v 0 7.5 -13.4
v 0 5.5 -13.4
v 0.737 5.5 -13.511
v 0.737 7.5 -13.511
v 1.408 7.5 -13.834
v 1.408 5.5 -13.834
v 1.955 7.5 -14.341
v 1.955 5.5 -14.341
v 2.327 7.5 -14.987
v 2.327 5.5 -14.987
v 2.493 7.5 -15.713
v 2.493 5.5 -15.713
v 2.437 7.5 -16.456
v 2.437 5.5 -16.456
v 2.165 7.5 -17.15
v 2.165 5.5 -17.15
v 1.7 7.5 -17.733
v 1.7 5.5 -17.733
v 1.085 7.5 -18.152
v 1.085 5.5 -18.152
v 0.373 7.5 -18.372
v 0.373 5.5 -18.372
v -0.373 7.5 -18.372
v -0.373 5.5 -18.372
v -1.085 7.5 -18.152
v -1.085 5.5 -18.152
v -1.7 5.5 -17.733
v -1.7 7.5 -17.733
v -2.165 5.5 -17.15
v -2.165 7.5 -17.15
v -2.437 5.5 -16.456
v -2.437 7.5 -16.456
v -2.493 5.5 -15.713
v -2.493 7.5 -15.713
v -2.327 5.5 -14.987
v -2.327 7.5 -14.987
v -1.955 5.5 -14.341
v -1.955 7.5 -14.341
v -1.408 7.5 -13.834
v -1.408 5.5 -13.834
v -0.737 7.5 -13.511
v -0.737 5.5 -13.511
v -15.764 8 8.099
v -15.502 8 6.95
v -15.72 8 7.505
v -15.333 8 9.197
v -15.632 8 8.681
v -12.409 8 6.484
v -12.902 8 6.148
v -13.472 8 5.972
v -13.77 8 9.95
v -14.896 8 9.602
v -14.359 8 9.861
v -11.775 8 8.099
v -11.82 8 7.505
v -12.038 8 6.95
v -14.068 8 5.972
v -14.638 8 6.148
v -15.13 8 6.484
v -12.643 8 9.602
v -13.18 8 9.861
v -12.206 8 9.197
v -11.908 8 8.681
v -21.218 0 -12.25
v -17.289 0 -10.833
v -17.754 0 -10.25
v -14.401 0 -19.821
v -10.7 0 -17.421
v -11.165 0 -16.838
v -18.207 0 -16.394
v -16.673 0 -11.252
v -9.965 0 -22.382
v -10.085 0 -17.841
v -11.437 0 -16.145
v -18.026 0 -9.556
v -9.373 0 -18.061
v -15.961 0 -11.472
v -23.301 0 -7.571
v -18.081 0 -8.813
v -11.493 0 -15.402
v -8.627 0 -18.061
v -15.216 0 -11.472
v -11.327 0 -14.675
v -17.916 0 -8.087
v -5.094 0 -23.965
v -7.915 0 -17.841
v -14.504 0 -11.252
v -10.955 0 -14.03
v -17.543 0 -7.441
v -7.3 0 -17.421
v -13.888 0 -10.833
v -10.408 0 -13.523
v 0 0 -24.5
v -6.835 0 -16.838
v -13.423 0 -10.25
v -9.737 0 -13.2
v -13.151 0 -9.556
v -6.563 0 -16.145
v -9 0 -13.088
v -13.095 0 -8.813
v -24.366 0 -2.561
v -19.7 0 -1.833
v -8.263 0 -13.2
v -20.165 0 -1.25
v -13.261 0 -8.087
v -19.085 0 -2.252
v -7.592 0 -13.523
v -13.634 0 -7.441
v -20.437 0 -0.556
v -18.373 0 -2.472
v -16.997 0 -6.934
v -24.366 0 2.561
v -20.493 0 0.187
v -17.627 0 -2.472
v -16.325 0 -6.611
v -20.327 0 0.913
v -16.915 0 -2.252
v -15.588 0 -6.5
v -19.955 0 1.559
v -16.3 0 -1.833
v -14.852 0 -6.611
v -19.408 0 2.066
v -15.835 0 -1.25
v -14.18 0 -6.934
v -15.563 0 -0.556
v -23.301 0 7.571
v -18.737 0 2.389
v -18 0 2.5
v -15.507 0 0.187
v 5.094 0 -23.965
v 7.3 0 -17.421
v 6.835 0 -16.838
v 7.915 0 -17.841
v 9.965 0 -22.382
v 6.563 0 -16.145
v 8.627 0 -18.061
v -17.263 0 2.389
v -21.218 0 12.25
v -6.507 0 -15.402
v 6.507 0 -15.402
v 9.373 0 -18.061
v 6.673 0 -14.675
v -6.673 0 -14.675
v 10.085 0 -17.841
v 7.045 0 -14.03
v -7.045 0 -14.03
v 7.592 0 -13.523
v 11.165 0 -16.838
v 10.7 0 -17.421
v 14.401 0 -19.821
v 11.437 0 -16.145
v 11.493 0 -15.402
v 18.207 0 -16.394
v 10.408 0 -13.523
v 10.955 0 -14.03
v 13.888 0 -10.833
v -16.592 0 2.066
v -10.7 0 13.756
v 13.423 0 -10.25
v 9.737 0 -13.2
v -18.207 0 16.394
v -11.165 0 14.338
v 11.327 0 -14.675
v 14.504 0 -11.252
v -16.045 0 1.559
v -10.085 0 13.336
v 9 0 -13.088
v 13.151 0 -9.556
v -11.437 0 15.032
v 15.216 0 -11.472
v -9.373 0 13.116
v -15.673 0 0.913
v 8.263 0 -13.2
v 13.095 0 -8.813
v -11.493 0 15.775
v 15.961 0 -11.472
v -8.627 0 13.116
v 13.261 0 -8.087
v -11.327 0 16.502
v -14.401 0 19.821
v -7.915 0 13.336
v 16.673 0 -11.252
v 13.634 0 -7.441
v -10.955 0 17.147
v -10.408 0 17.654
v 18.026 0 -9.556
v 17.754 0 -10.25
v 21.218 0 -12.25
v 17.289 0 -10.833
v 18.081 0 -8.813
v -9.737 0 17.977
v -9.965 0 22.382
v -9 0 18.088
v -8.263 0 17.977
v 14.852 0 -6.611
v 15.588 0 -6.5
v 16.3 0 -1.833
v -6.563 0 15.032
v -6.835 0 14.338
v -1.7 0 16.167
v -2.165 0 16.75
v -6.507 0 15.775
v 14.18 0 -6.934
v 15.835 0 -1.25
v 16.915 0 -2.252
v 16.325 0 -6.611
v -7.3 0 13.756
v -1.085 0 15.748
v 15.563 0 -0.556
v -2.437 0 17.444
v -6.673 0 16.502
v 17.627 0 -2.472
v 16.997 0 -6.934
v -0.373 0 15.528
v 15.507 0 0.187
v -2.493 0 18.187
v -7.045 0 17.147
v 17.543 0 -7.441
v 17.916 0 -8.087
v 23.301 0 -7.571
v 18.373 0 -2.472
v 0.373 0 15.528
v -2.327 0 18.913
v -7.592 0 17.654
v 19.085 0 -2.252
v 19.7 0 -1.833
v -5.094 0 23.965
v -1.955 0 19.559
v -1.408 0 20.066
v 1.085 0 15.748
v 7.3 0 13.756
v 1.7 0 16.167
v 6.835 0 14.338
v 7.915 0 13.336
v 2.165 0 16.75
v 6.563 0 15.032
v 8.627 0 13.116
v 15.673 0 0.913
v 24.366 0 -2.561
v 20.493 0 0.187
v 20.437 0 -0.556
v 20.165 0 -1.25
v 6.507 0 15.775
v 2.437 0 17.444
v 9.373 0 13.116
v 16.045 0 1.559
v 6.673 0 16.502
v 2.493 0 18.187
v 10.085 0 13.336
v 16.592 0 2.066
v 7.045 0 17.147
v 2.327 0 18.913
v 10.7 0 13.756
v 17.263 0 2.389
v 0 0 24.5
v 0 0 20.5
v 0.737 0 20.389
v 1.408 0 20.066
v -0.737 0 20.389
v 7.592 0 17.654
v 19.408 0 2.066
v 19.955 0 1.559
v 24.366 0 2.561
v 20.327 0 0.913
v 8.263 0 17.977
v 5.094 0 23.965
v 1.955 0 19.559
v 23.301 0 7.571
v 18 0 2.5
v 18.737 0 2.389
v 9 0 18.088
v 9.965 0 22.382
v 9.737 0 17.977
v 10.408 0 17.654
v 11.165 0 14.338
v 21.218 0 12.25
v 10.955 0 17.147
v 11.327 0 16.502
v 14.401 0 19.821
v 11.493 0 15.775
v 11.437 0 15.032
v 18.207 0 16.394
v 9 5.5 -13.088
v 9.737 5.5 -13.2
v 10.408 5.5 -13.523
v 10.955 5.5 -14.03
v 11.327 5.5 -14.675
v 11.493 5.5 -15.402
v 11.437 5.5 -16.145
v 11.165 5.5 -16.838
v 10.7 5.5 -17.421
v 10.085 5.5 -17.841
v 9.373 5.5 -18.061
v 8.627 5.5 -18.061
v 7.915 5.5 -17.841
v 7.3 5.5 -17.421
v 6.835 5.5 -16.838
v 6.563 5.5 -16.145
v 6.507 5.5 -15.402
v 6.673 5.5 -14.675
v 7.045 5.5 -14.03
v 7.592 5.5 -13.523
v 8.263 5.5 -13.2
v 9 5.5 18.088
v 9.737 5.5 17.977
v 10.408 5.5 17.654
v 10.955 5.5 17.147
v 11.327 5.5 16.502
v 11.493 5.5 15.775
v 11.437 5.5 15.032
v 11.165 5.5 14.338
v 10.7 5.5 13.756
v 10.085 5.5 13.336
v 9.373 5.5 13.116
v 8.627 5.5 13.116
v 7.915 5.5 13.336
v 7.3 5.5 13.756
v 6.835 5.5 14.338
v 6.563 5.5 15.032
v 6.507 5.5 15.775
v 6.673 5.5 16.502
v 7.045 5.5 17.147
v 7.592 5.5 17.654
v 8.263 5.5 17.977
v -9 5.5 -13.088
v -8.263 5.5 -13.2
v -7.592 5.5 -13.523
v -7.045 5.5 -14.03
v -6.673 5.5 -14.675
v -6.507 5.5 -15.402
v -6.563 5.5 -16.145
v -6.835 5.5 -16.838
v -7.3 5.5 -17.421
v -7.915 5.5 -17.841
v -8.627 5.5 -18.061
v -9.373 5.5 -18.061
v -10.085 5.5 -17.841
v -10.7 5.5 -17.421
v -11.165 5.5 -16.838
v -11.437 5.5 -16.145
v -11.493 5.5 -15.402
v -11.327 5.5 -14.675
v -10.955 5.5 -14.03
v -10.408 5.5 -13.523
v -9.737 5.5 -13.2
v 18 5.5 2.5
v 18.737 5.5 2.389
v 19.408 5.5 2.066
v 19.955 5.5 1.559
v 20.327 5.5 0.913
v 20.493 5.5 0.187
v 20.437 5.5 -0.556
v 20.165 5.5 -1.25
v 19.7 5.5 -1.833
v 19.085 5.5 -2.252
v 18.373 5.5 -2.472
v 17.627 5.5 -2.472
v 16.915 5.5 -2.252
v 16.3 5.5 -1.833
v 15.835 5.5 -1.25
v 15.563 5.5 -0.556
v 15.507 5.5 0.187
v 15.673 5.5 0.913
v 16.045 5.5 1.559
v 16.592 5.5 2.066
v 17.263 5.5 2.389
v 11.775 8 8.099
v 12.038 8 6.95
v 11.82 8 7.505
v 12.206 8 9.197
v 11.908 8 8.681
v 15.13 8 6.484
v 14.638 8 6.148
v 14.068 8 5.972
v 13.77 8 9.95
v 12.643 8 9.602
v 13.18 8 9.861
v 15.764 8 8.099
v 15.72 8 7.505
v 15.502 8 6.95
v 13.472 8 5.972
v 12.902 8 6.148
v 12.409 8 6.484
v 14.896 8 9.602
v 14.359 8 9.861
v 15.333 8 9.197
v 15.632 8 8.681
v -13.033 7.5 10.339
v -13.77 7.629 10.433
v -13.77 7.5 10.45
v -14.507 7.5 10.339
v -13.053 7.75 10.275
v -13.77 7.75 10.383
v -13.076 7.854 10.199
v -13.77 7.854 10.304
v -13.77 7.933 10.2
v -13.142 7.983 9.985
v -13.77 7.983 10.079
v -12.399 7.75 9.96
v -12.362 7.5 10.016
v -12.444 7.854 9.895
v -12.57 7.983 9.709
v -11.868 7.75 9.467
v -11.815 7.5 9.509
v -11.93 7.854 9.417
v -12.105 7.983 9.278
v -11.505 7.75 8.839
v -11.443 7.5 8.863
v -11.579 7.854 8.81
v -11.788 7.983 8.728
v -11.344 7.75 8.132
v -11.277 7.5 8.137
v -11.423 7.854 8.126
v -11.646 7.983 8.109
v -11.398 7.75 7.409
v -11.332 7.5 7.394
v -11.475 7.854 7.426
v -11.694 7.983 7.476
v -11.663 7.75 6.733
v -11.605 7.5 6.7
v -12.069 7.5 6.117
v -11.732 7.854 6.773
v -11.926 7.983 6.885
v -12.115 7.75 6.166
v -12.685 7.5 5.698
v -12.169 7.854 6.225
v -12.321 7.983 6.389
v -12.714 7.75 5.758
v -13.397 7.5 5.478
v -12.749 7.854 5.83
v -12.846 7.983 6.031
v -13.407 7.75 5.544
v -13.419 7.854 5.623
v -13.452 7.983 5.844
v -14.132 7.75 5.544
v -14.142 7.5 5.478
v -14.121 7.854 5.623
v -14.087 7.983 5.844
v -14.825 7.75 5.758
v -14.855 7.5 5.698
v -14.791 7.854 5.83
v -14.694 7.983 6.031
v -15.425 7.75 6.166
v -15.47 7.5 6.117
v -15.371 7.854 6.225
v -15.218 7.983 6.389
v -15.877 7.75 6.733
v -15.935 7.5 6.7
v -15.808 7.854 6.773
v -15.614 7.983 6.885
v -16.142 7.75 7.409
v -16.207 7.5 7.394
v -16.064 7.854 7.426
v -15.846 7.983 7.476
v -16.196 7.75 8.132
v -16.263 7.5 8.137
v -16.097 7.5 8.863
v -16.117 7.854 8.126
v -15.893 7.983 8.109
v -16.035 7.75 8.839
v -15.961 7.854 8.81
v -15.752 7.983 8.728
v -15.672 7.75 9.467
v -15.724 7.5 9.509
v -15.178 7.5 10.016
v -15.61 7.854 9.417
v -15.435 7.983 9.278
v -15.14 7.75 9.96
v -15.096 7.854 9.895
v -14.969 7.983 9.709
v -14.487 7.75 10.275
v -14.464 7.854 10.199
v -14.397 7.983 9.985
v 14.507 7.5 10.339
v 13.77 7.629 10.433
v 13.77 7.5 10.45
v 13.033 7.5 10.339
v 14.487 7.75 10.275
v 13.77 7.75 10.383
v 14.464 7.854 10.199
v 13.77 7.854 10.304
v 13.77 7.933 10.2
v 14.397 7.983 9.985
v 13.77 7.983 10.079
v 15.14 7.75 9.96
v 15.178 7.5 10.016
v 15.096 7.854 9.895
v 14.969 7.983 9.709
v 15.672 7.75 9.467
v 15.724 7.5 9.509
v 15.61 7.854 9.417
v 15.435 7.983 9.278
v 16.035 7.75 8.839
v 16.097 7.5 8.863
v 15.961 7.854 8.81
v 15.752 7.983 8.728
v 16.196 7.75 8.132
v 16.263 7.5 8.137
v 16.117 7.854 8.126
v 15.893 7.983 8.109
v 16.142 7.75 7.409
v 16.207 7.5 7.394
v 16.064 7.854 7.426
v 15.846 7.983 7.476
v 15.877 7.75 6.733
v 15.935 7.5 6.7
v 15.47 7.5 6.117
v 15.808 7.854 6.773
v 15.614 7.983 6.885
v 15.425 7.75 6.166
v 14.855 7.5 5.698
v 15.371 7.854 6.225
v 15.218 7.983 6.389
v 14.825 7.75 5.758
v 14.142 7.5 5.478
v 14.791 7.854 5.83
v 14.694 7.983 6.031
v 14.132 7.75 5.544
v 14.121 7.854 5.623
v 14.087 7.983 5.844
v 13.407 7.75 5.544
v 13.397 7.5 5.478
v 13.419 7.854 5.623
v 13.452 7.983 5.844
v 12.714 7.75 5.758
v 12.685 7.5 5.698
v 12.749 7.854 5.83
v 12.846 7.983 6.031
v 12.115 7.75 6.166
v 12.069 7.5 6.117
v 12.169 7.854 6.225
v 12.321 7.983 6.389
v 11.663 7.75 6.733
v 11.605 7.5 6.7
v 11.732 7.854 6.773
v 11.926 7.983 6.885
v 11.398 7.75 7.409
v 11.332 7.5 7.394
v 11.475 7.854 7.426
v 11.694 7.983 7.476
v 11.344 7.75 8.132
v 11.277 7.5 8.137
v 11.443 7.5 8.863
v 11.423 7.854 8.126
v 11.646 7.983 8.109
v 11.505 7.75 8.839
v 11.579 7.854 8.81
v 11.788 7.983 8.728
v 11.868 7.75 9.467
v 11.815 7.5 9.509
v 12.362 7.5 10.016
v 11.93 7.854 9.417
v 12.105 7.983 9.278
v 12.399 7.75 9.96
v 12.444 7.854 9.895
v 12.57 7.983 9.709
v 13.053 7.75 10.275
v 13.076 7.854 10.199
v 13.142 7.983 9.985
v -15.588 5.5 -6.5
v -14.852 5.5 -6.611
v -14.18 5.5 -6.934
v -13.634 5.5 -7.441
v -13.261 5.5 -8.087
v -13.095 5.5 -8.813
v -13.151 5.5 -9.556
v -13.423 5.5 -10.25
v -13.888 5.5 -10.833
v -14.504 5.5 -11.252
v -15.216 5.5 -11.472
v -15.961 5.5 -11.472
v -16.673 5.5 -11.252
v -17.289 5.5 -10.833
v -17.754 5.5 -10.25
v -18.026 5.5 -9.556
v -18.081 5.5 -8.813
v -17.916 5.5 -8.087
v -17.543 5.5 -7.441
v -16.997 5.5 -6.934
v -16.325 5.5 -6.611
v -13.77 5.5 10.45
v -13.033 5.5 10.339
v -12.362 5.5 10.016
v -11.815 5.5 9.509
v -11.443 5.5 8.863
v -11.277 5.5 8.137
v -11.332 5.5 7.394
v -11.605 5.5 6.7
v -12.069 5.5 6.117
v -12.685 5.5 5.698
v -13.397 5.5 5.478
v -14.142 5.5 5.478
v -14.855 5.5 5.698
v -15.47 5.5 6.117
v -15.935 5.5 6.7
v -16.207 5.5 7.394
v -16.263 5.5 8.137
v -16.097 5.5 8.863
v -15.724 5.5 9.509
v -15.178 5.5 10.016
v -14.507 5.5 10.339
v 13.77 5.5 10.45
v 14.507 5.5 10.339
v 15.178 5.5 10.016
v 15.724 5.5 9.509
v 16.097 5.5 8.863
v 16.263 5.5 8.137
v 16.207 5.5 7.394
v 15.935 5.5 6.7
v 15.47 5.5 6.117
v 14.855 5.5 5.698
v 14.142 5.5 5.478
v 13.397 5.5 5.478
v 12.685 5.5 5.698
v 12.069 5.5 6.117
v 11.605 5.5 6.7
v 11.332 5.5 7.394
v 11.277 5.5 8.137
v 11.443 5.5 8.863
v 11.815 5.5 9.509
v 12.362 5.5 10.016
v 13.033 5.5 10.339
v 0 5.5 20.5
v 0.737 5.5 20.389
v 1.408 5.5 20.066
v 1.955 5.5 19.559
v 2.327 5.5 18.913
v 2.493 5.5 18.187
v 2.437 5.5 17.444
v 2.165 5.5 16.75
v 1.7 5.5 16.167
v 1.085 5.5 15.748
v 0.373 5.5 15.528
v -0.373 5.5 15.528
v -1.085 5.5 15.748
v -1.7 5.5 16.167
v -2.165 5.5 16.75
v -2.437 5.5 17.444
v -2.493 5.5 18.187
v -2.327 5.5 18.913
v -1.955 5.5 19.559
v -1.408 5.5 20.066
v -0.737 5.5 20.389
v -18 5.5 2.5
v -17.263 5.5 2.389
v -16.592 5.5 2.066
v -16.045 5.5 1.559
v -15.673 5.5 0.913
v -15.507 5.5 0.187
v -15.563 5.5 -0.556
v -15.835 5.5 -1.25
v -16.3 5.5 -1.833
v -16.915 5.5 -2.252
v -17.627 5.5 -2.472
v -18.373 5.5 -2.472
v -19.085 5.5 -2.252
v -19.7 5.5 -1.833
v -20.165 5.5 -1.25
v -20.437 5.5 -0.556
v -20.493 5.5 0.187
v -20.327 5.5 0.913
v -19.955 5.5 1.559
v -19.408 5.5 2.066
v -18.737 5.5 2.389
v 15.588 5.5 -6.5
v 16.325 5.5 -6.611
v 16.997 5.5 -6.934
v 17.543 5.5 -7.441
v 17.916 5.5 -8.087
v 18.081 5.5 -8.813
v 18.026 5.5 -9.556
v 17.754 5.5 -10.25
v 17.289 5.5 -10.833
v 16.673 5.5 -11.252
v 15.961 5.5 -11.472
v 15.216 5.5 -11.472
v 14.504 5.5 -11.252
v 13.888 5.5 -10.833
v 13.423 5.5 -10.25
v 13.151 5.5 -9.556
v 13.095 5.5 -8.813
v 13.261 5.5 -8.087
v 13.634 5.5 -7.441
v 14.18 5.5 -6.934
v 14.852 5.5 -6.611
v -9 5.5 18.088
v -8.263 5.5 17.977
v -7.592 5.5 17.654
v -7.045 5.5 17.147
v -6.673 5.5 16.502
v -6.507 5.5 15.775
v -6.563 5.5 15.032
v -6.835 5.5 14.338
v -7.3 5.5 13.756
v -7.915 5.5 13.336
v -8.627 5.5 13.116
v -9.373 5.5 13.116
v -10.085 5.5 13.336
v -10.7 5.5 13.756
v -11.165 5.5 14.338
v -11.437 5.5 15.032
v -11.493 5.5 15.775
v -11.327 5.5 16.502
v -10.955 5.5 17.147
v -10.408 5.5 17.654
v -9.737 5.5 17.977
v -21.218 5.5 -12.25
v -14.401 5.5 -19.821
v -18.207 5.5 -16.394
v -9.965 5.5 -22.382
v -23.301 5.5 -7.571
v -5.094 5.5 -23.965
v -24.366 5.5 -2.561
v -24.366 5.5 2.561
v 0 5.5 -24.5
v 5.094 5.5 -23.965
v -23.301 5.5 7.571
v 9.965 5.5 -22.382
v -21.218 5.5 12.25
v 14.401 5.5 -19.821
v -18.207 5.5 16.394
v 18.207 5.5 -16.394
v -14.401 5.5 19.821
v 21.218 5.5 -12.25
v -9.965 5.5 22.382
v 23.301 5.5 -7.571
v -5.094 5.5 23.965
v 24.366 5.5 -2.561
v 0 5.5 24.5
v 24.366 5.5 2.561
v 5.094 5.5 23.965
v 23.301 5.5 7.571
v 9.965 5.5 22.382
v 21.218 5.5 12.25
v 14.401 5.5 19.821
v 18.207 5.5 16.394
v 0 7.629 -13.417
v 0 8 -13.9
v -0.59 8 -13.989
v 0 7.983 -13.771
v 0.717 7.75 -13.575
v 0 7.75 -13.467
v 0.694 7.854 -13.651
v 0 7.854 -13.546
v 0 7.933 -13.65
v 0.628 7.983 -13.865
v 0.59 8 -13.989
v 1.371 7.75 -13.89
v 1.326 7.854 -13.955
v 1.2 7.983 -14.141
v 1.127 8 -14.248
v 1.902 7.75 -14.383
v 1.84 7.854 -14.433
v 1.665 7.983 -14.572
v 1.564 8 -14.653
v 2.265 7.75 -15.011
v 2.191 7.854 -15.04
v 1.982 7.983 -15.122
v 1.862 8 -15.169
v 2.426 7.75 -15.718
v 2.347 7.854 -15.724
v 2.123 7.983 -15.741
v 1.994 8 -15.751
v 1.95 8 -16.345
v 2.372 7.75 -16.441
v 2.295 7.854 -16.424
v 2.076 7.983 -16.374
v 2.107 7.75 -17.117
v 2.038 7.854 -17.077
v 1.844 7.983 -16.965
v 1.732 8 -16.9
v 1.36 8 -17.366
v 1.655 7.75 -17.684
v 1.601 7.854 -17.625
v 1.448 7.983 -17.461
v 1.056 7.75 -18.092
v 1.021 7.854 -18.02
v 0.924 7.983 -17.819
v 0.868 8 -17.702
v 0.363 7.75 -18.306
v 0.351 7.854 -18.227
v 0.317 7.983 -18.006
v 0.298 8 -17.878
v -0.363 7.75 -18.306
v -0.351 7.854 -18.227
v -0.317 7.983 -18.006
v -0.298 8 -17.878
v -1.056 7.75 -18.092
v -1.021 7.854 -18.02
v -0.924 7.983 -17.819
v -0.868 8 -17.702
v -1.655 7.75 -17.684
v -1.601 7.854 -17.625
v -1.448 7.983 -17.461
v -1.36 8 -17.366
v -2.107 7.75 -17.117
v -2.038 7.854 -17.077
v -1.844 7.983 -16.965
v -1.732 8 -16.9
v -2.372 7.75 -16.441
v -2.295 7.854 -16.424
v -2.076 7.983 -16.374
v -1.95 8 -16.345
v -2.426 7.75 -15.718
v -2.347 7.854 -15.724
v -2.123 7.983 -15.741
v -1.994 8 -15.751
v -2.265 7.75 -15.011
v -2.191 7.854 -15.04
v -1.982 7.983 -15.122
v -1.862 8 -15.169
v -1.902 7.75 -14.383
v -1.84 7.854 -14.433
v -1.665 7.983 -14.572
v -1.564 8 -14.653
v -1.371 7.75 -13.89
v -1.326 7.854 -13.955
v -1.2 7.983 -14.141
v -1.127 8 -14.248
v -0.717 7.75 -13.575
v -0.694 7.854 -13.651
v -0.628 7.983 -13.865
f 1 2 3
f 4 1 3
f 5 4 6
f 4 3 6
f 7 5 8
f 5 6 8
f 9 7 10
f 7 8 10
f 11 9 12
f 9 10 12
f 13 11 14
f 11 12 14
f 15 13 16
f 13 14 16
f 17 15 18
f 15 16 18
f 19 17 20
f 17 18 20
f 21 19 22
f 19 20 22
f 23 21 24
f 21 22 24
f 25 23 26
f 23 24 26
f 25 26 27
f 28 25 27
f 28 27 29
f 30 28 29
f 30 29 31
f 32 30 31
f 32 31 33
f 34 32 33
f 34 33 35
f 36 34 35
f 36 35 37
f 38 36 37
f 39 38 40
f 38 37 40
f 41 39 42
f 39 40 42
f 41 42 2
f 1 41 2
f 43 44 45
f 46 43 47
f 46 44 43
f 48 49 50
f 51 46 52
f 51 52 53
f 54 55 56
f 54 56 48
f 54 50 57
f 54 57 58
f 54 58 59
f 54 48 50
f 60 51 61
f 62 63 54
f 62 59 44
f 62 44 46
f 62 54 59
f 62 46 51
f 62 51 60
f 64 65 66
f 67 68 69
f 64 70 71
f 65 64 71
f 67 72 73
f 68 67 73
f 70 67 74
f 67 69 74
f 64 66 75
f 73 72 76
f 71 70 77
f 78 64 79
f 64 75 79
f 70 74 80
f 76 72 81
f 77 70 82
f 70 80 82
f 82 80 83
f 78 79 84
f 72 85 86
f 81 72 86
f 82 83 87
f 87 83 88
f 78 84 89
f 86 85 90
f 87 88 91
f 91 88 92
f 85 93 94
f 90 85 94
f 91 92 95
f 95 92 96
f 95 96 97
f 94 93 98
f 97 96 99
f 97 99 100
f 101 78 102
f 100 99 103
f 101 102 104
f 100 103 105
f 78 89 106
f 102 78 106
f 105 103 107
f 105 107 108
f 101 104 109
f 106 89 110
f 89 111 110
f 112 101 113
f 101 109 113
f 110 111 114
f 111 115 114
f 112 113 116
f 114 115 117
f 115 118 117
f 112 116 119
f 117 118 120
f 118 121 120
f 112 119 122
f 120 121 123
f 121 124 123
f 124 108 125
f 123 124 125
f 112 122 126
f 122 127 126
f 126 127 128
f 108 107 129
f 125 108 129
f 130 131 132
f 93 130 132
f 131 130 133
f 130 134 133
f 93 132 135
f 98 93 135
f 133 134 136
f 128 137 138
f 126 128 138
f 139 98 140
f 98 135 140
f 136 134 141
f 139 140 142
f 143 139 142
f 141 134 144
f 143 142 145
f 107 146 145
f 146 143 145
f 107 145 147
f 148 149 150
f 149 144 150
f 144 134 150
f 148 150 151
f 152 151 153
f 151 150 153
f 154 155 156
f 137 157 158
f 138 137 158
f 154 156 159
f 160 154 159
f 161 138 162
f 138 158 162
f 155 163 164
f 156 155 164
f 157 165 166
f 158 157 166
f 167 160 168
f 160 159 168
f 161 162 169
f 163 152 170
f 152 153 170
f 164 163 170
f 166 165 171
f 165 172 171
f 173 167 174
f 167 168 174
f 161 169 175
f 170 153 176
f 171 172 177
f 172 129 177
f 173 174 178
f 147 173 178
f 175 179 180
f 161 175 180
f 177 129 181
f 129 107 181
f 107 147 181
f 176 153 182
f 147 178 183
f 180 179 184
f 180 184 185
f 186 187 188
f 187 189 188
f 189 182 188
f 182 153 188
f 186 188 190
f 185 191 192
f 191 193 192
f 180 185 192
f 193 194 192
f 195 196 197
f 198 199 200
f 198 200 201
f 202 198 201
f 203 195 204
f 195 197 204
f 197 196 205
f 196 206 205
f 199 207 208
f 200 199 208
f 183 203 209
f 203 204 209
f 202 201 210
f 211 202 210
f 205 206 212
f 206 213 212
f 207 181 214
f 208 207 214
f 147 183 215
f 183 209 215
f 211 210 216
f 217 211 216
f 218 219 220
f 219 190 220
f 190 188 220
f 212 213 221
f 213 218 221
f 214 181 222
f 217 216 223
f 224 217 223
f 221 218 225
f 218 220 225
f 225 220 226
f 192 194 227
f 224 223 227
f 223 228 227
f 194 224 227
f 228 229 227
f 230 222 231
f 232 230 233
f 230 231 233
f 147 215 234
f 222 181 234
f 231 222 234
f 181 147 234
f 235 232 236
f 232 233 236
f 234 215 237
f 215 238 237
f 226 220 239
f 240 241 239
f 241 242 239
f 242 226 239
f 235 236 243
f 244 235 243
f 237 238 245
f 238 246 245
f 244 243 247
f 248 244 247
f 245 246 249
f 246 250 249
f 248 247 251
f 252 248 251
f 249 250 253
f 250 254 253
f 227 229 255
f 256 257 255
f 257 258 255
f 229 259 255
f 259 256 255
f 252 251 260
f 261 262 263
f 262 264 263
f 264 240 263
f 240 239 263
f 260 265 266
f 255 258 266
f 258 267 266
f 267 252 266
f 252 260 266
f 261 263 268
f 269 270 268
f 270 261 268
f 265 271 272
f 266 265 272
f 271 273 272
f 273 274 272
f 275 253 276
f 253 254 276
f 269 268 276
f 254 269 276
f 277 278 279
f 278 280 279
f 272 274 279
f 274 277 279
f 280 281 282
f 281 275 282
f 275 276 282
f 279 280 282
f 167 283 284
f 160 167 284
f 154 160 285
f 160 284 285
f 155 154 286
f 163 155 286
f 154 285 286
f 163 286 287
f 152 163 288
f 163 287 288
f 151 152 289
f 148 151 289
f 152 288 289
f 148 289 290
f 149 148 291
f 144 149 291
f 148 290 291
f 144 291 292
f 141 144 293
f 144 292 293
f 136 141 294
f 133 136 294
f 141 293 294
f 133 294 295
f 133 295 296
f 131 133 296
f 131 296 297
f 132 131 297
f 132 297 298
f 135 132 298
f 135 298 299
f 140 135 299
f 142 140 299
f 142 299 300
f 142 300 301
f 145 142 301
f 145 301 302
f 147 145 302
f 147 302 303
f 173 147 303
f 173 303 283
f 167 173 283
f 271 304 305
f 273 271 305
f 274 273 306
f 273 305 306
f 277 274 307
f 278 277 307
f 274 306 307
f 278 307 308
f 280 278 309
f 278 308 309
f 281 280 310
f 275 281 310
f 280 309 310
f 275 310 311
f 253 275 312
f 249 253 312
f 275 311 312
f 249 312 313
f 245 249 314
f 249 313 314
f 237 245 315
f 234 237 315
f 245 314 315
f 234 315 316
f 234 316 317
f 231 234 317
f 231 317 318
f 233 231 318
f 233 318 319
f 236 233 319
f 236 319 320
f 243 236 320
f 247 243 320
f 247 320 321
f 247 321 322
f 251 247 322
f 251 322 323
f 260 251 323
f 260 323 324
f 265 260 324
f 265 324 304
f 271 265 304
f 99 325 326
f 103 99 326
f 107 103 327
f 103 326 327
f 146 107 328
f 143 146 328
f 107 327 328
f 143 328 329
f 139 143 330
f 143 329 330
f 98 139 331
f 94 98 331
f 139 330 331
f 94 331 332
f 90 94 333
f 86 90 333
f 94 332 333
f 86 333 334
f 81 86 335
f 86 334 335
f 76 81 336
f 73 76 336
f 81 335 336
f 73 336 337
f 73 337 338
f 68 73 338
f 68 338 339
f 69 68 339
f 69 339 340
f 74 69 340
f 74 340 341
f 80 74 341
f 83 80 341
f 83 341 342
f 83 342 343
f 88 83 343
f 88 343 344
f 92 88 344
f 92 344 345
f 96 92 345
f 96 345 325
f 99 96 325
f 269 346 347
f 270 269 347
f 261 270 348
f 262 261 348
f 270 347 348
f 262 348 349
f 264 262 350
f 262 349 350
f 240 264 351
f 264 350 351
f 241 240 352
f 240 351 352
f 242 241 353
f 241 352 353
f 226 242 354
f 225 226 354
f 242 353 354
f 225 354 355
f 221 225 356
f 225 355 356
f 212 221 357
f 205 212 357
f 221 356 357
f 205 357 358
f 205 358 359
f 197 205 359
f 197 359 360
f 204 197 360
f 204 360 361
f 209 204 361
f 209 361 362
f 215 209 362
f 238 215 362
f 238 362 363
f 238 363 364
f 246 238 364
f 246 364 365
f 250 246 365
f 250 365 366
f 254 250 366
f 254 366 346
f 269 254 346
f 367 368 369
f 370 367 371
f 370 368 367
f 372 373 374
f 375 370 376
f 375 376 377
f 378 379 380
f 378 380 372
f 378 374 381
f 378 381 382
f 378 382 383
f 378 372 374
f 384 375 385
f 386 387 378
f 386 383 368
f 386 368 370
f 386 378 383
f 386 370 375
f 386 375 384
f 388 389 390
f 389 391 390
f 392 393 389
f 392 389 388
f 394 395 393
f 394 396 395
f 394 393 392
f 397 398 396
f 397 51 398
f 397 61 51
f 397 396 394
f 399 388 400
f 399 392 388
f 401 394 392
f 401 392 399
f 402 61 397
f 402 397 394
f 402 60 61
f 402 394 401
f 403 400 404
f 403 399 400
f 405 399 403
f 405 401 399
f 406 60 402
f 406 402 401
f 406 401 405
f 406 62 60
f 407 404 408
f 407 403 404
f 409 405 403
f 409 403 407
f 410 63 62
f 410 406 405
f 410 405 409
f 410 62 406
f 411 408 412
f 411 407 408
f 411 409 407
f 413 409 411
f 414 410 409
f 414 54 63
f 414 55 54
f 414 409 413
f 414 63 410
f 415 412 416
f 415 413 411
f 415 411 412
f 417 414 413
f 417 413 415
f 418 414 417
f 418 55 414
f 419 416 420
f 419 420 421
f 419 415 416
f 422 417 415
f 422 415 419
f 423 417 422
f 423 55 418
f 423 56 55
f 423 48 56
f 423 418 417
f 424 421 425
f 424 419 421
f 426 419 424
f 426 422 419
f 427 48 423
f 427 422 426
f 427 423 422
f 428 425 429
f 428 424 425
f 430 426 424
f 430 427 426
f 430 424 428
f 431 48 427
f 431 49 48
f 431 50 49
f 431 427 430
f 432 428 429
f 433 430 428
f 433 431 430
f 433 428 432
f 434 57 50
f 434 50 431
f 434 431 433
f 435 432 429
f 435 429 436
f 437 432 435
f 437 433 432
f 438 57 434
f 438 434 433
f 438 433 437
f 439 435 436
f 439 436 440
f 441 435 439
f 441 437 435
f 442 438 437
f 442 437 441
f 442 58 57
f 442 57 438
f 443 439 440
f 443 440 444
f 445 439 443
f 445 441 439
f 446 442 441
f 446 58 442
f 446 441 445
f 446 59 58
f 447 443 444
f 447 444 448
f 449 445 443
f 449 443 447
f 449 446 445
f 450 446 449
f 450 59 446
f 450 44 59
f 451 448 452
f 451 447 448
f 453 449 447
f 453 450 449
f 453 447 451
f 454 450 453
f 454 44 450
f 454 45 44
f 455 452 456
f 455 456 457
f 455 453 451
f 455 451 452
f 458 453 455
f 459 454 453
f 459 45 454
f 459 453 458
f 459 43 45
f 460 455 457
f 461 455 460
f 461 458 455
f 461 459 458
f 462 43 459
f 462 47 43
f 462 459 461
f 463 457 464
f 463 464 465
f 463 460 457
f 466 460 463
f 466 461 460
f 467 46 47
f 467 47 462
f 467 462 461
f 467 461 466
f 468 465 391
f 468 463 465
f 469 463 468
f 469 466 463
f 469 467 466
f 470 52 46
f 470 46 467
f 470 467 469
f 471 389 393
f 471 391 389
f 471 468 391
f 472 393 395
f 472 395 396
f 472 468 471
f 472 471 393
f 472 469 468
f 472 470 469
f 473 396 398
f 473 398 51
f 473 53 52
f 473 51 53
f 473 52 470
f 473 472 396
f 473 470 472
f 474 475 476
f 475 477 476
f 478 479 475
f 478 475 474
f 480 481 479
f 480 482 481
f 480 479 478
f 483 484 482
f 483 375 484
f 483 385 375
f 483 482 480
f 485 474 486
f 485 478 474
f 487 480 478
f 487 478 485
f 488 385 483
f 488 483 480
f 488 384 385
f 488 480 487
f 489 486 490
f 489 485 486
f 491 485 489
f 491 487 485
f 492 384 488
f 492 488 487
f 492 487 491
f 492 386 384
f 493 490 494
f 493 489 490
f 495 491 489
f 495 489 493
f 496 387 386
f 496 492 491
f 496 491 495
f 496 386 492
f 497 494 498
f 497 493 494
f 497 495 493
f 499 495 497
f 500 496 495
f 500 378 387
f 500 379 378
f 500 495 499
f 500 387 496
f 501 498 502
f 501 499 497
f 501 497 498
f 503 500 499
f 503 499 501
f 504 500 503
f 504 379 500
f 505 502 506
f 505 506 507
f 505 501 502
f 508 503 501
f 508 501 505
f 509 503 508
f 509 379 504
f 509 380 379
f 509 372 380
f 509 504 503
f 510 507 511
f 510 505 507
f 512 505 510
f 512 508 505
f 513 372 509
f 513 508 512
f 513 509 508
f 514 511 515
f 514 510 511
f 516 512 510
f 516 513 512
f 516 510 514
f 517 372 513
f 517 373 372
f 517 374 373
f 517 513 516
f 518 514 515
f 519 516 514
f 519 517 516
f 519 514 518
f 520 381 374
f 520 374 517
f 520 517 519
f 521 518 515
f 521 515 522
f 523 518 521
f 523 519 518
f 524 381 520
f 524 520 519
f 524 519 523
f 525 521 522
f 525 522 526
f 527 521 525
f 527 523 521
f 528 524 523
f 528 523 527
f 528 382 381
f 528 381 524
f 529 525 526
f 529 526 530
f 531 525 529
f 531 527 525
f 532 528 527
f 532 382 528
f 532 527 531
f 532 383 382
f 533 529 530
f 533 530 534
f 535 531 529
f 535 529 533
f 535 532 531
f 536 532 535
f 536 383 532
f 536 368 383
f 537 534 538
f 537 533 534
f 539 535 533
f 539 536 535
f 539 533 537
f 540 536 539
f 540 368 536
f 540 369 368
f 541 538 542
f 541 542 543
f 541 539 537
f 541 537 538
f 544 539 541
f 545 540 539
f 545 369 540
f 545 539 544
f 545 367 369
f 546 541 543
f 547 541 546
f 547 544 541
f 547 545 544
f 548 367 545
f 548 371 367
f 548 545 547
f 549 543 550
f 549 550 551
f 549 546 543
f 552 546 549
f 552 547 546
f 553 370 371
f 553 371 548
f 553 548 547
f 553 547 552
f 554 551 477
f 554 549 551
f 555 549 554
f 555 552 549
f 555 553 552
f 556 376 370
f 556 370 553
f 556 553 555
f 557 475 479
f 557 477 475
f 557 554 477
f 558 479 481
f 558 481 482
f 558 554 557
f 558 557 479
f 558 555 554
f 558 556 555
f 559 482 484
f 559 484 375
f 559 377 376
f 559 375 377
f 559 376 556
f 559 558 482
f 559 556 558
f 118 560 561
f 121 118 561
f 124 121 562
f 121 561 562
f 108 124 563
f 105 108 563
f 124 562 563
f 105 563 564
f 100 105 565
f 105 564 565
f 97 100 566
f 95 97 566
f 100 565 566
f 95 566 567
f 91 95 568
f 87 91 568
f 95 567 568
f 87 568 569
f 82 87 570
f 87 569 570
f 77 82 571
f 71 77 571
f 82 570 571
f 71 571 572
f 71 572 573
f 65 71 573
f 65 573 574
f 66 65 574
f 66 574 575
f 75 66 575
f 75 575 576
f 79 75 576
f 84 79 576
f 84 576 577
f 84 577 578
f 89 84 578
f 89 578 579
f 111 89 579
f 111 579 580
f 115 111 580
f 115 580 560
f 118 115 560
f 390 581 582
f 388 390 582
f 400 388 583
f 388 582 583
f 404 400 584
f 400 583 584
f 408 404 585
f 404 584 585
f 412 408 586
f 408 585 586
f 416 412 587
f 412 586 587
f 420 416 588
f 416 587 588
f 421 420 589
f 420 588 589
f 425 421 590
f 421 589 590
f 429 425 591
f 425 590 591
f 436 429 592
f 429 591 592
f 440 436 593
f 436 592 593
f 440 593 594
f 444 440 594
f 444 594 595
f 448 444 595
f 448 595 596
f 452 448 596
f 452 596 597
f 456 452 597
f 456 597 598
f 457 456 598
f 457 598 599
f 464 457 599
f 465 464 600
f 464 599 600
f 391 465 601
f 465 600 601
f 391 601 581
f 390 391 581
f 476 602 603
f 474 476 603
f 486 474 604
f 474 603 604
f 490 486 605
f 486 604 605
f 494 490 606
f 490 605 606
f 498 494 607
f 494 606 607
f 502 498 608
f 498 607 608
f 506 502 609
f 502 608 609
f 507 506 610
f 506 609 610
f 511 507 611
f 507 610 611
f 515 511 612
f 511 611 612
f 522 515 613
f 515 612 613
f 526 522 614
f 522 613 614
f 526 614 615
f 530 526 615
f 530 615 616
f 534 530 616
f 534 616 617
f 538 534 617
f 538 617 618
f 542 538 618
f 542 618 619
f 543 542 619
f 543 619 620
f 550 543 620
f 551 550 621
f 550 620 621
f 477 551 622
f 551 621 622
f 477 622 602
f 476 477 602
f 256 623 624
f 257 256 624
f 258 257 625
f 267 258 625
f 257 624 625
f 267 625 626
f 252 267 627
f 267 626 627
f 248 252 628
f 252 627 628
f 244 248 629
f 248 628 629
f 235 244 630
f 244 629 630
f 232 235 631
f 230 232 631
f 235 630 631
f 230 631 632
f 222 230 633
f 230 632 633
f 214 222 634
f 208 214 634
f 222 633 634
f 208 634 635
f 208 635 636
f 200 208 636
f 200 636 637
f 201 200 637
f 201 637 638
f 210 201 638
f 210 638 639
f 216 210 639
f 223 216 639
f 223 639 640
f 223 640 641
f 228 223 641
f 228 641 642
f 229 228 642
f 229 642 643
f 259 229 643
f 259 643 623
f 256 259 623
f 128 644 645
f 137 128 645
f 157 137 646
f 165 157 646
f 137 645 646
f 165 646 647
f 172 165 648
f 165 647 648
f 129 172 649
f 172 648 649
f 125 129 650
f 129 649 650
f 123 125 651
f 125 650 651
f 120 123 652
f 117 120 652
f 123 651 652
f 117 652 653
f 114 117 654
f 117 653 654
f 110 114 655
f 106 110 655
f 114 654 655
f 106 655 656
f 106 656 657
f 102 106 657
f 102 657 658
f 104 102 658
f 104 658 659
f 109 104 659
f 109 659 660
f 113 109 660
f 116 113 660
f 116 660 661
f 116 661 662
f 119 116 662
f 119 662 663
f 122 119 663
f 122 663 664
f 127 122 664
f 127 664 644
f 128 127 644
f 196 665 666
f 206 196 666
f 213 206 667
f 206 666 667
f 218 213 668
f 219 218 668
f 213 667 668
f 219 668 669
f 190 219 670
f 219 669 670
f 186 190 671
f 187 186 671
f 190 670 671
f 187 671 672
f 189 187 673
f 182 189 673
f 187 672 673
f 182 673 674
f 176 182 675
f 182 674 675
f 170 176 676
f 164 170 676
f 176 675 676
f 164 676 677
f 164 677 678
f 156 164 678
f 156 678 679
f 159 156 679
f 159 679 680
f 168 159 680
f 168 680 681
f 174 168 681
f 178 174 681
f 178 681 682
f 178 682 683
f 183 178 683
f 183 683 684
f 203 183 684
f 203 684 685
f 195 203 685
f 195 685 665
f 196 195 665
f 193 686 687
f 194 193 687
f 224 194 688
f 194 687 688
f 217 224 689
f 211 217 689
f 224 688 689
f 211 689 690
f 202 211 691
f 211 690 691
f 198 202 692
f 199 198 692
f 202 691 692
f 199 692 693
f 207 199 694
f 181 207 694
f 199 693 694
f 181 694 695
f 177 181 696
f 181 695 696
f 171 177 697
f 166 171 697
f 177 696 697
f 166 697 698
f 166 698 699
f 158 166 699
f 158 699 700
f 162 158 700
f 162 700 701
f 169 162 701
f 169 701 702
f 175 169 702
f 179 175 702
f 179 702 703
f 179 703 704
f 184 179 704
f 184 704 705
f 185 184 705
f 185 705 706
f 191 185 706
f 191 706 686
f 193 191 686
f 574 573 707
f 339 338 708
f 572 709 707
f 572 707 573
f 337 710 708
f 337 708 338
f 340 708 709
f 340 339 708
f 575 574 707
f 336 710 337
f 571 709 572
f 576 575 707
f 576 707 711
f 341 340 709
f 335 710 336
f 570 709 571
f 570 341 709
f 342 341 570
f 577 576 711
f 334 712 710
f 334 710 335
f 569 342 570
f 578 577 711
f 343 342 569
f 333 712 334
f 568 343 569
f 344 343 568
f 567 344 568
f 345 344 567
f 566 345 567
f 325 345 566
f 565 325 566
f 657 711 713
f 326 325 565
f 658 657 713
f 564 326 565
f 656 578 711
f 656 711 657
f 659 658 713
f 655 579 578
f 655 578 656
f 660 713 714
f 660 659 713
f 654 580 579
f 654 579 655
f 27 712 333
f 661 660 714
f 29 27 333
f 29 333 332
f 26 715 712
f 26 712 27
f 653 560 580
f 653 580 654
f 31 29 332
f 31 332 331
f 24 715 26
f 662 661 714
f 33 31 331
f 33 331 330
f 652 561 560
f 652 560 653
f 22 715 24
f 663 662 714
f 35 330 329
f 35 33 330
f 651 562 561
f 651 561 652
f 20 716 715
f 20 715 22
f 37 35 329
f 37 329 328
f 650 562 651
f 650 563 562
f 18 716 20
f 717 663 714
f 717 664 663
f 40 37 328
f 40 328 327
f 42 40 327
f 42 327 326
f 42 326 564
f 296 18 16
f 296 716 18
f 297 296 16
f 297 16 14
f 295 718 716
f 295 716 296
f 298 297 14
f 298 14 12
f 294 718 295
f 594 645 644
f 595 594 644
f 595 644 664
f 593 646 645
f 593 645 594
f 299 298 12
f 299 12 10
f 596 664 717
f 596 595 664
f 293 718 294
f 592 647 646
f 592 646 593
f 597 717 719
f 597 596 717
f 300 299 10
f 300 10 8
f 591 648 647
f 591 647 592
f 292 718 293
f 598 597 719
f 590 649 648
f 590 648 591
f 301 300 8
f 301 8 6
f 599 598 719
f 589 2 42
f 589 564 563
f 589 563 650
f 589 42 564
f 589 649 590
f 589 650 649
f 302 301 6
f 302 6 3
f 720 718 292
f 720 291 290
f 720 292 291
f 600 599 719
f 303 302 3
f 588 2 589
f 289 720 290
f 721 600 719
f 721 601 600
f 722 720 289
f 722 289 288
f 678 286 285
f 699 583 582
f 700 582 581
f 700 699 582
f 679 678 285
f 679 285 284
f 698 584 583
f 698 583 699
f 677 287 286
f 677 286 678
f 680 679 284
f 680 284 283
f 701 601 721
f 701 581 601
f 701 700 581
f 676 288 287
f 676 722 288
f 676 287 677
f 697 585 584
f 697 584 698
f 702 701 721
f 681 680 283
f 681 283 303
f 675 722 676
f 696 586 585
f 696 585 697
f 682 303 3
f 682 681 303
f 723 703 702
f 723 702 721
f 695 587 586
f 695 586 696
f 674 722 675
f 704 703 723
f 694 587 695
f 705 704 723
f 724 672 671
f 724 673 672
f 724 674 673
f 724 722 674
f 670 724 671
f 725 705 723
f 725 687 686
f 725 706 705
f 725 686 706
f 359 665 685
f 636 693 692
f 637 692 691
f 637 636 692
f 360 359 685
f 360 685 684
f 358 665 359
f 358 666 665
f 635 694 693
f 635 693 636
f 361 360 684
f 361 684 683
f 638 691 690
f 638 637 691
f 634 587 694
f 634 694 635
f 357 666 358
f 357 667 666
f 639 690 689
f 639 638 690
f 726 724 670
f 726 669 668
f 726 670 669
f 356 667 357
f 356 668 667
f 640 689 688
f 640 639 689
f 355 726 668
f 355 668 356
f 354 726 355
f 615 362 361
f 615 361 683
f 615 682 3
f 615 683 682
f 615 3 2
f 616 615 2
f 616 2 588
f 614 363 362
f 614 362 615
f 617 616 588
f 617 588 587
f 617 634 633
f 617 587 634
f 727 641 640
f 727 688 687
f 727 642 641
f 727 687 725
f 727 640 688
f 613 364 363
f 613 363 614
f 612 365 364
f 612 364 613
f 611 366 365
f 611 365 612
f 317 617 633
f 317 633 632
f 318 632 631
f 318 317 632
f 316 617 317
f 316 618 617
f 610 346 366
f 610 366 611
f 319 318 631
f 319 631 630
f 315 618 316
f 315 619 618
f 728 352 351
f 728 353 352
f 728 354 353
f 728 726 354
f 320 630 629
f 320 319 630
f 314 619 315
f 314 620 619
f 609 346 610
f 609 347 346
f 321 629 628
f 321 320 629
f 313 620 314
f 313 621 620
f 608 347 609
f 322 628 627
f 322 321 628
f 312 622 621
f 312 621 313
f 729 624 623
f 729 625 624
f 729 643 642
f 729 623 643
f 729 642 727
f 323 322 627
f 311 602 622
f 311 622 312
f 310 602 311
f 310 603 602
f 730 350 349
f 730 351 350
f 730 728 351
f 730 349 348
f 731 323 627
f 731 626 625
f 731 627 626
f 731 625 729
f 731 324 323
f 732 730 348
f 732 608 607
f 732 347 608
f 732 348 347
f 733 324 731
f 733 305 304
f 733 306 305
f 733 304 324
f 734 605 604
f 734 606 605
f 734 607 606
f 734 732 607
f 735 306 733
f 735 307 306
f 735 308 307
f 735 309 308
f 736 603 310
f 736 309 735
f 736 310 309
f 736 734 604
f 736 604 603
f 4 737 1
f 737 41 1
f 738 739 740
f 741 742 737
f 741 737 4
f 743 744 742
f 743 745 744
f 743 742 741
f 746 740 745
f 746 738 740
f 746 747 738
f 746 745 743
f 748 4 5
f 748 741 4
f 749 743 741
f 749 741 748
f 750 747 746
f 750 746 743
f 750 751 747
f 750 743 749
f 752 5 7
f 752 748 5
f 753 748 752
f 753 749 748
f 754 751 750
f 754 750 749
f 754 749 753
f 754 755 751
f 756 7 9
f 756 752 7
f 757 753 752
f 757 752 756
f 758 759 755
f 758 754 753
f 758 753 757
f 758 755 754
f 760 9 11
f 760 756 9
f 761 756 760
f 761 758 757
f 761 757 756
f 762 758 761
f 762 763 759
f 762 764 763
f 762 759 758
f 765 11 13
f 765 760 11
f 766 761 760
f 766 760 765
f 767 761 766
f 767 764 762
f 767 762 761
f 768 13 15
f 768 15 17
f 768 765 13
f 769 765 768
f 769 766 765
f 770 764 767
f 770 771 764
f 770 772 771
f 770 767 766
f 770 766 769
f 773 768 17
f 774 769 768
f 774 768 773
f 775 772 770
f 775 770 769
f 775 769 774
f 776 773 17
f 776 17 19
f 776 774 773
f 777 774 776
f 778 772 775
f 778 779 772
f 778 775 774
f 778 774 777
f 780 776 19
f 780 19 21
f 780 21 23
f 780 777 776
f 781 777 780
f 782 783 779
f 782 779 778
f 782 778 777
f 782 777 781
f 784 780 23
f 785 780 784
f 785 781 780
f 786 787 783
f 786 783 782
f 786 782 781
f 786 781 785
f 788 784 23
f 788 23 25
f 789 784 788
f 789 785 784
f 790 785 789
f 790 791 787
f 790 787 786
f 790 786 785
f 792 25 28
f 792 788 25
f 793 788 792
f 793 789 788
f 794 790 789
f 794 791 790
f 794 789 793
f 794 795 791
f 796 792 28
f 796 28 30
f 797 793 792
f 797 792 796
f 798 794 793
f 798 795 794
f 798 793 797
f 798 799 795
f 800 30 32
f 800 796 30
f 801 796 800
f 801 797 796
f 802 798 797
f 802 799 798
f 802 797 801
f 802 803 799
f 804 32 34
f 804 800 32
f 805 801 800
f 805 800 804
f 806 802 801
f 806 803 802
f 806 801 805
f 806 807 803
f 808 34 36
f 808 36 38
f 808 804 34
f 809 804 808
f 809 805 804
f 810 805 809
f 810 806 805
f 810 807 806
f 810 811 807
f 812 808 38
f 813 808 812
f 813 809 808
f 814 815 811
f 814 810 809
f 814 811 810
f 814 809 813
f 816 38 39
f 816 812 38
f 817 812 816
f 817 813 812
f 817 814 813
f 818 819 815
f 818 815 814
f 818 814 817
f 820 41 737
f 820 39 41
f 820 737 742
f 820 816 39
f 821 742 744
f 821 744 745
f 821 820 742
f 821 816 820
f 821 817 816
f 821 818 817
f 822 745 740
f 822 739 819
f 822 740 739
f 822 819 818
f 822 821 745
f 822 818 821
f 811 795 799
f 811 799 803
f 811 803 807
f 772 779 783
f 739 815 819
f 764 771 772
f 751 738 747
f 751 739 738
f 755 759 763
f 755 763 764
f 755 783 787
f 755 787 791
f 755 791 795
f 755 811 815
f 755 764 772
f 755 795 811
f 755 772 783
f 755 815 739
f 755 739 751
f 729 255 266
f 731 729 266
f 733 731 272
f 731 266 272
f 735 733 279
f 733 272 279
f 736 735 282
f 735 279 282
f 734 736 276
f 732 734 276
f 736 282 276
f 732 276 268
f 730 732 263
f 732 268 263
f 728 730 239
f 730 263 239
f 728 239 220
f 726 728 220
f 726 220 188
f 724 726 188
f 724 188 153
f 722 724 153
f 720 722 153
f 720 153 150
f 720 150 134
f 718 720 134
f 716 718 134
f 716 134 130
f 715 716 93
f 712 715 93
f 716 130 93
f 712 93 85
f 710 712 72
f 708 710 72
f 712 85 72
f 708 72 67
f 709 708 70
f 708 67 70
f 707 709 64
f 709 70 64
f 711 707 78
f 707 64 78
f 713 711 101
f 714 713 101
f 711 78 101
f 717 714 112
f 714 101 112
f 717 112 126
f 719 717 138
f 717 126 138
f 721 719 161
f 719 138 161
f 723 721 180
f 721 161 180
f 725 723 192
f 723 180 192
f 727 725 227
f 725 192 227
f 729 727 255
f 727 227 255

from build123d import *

# Parameters (mm, degrees)
SKETCH1_R           = 24.5
BOSS_EXTRUDE1_DEPTH = 5.5
SKETCH2_R           = 2.5
CUT_EXTRUDE1_DEPTH  = 6.6
SKETCH6_R           = 2.5
BOSS_EXTRUDE2_DEPTH = 2.5
FILLET1_R           = 0.5


with BuildPart() as part:
    # Sketch1 → Boss-Extrude1 (new body)
    with BuildSketch(Plane(origin=(0, 0, 0), x_dir=(1, 0, 0), z_dir=(0, 1, 0))):
        with Locations(Location((0, 0, 0), (0, 0, 270))):
            Circle(SKETCH1_R)
    extrude(amount=BOSS_EXTRUDE1_DEPTH)

    # Sketch2 → Cut-Extrude1 (cut)
    with BuildSketch(Plane(origin=(0, 5.5, 0), x_dir=(1, 0, 0), z_dir=(0, 1, 0))):
        with Locations(Location((-9, -15.588457268, 0), (0, 0, 270))):
            Circle(SKETCH2_R)
        with Locations(Location((-15.588457268, 9, 0), (0, 0, 270))):
            Circle(SKETCH2_R)
        with Locations(Location((-18, 0, 0), (0, 0, 270))):
            Circle(SKETCH2_R)
        with Locations(Location((0, -18, 0), (0, 0, 270))):
            Circle(SKETCH2_R)
        with Locations(Location((9, -15.588457268, 0), (0, 0, 270))):
            Circle(SKETCH2_R)
        with Locations(Location((-9, 15.588457268, 0), (0, 0, 270))):
            Circle(SKETCH2_R)
        with Locations(Location((9, 15.588457268, 0), (0, 0, 270))):
            Circle(SKETCH2_R)
        with Locations(Location((15.588457268, 9, 0), (0, 0, 270))):
            Circle(SKETCH2_R)
        with Locations(Location((18, 0, 0), (0, 0, 270))):
            Circle(SKETCH2_R)
    extrude(amount=-CUT_EXTRUDE1_DEPTH, mode=Mode.SUBTRACT)

    # Sketch6 → Boss-Extrude2 (add)
    with BuildSketch(Plane(origin=(0, 5.5, 0), x_dir=(1, 0, 0), z_dir=(0, 1, 0))):
        with Locations(Location((0, 15.9, 0), (0, 0, 270))):
            Circle(SKETCH6_R)
        with Locations(Location((13.76980392, -7.95, 0), (0, 0, 270))):
            Circle(SKETCH6_R)
        with Locations(Location((-13.76980392, -7.95, 0), (0, 0, 270))):
            Circle(SKETCH6_R)
    extrude(amount=BOSS_EXTRUDE2_DEPTH)

    # Fillet1
    fillet1_edges = [part.edges().sort_by_distance(p)[0] for p in [
        (0, 8, -18.4),
        (13.76980392, 8, 5.45),
        (-13.76980392, 8, 5.45),
    ]]
    fillet(fillet1_edges, radius=FILLET1_R)


solid = part.part
